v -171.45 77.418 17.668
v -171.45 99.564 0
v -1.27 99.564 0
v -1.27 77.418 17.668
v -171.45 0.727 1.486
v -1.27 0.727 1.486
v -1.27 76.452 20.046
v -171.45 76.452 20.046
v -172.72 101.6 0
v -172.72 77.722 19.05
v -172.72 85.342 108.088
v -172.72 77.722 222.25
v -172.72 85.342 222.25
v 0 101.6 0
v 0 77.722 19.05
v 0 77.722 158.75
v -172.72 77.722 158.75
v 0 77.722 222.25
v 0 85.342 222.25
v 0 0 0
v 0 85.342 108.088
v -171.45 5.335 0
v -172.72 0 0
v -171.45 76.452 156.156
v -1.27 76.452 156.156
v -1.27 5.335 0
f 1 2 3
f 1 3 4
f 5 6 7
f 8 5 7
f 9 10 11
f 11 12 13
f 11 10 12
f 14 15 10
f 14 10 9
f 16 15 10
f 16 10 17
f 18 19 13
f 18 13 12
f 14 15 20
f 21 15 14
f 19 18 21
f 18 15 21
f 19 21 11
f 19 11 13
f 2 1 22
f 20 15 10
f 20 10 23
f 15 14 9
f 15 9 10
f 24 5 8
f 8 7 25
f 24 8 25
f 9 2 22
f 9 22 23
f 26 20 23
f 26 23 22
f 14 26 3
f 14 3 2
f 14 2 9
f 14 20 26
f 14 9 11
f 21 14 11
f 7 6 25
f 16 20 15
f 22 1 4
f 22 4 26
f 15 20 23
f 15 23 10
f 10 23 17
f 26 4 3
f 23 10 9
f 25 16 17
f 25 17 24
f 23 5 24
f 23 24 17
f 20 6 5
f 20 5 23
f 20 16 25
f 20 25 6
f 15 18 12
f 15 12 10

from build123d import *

# Parameters (mm, degrees)
F1_DEPTH = 172.72
F2_DEPTH = 172.72
F3_DEPTH = 172.72
F4_T     = -1.27
F5_T     = -1.27


with BuildPart() as f1:
    # F0 (on Right) → F1 (new body)
    with BuildSketch(Plane.YZ):
        Polygon((77.72243, 158.75), (0, 0), (77.72243, 19.05), align=None)
    extrude(amount=-F1_DEPTH)

    # F4
    f4_openings = [f1.faces().sort_by_distance(p)[0] for p in [
        (-86.36, 38.861215, 79.375),
    ]]
    offset(amount=F4_T, openings=f4_openings)


with BuildPart() as f2:
    # F0 (on Right) → F2 (new body)
    with BuildSketch(Plane.YZ):
        Polygon((77.72243, 19.05), (101.6, 0), (85.34243, 108.088437), (77.72243, 158.75), align=None)
        Polygon((77.72243, 222.25), (77.72243, 158.75), (85.34243, 108.088437), (85.34243, 222.25), align=None)
    extrude(amount=-F2_DEPTH)


with BuildPart() as f3:
    # F0 (on Right) → F3 (new body)
    with BuildSketch(Plane.YZ):
        Polygon((77.72243, 19.05), (0, 0), (101.6, 0), align=None)
    extrude(amount=-F3_DEPTH)

    # F5
    f5_openings = [f3.faces().sort_by_distance(p)[0] for p in [
        (-86.36, 50.8, 0),
    ]]
    offset(amount=F5_T, openings=f5_openings)


solid = Compound([f1.part, f2.part, f3.part])
